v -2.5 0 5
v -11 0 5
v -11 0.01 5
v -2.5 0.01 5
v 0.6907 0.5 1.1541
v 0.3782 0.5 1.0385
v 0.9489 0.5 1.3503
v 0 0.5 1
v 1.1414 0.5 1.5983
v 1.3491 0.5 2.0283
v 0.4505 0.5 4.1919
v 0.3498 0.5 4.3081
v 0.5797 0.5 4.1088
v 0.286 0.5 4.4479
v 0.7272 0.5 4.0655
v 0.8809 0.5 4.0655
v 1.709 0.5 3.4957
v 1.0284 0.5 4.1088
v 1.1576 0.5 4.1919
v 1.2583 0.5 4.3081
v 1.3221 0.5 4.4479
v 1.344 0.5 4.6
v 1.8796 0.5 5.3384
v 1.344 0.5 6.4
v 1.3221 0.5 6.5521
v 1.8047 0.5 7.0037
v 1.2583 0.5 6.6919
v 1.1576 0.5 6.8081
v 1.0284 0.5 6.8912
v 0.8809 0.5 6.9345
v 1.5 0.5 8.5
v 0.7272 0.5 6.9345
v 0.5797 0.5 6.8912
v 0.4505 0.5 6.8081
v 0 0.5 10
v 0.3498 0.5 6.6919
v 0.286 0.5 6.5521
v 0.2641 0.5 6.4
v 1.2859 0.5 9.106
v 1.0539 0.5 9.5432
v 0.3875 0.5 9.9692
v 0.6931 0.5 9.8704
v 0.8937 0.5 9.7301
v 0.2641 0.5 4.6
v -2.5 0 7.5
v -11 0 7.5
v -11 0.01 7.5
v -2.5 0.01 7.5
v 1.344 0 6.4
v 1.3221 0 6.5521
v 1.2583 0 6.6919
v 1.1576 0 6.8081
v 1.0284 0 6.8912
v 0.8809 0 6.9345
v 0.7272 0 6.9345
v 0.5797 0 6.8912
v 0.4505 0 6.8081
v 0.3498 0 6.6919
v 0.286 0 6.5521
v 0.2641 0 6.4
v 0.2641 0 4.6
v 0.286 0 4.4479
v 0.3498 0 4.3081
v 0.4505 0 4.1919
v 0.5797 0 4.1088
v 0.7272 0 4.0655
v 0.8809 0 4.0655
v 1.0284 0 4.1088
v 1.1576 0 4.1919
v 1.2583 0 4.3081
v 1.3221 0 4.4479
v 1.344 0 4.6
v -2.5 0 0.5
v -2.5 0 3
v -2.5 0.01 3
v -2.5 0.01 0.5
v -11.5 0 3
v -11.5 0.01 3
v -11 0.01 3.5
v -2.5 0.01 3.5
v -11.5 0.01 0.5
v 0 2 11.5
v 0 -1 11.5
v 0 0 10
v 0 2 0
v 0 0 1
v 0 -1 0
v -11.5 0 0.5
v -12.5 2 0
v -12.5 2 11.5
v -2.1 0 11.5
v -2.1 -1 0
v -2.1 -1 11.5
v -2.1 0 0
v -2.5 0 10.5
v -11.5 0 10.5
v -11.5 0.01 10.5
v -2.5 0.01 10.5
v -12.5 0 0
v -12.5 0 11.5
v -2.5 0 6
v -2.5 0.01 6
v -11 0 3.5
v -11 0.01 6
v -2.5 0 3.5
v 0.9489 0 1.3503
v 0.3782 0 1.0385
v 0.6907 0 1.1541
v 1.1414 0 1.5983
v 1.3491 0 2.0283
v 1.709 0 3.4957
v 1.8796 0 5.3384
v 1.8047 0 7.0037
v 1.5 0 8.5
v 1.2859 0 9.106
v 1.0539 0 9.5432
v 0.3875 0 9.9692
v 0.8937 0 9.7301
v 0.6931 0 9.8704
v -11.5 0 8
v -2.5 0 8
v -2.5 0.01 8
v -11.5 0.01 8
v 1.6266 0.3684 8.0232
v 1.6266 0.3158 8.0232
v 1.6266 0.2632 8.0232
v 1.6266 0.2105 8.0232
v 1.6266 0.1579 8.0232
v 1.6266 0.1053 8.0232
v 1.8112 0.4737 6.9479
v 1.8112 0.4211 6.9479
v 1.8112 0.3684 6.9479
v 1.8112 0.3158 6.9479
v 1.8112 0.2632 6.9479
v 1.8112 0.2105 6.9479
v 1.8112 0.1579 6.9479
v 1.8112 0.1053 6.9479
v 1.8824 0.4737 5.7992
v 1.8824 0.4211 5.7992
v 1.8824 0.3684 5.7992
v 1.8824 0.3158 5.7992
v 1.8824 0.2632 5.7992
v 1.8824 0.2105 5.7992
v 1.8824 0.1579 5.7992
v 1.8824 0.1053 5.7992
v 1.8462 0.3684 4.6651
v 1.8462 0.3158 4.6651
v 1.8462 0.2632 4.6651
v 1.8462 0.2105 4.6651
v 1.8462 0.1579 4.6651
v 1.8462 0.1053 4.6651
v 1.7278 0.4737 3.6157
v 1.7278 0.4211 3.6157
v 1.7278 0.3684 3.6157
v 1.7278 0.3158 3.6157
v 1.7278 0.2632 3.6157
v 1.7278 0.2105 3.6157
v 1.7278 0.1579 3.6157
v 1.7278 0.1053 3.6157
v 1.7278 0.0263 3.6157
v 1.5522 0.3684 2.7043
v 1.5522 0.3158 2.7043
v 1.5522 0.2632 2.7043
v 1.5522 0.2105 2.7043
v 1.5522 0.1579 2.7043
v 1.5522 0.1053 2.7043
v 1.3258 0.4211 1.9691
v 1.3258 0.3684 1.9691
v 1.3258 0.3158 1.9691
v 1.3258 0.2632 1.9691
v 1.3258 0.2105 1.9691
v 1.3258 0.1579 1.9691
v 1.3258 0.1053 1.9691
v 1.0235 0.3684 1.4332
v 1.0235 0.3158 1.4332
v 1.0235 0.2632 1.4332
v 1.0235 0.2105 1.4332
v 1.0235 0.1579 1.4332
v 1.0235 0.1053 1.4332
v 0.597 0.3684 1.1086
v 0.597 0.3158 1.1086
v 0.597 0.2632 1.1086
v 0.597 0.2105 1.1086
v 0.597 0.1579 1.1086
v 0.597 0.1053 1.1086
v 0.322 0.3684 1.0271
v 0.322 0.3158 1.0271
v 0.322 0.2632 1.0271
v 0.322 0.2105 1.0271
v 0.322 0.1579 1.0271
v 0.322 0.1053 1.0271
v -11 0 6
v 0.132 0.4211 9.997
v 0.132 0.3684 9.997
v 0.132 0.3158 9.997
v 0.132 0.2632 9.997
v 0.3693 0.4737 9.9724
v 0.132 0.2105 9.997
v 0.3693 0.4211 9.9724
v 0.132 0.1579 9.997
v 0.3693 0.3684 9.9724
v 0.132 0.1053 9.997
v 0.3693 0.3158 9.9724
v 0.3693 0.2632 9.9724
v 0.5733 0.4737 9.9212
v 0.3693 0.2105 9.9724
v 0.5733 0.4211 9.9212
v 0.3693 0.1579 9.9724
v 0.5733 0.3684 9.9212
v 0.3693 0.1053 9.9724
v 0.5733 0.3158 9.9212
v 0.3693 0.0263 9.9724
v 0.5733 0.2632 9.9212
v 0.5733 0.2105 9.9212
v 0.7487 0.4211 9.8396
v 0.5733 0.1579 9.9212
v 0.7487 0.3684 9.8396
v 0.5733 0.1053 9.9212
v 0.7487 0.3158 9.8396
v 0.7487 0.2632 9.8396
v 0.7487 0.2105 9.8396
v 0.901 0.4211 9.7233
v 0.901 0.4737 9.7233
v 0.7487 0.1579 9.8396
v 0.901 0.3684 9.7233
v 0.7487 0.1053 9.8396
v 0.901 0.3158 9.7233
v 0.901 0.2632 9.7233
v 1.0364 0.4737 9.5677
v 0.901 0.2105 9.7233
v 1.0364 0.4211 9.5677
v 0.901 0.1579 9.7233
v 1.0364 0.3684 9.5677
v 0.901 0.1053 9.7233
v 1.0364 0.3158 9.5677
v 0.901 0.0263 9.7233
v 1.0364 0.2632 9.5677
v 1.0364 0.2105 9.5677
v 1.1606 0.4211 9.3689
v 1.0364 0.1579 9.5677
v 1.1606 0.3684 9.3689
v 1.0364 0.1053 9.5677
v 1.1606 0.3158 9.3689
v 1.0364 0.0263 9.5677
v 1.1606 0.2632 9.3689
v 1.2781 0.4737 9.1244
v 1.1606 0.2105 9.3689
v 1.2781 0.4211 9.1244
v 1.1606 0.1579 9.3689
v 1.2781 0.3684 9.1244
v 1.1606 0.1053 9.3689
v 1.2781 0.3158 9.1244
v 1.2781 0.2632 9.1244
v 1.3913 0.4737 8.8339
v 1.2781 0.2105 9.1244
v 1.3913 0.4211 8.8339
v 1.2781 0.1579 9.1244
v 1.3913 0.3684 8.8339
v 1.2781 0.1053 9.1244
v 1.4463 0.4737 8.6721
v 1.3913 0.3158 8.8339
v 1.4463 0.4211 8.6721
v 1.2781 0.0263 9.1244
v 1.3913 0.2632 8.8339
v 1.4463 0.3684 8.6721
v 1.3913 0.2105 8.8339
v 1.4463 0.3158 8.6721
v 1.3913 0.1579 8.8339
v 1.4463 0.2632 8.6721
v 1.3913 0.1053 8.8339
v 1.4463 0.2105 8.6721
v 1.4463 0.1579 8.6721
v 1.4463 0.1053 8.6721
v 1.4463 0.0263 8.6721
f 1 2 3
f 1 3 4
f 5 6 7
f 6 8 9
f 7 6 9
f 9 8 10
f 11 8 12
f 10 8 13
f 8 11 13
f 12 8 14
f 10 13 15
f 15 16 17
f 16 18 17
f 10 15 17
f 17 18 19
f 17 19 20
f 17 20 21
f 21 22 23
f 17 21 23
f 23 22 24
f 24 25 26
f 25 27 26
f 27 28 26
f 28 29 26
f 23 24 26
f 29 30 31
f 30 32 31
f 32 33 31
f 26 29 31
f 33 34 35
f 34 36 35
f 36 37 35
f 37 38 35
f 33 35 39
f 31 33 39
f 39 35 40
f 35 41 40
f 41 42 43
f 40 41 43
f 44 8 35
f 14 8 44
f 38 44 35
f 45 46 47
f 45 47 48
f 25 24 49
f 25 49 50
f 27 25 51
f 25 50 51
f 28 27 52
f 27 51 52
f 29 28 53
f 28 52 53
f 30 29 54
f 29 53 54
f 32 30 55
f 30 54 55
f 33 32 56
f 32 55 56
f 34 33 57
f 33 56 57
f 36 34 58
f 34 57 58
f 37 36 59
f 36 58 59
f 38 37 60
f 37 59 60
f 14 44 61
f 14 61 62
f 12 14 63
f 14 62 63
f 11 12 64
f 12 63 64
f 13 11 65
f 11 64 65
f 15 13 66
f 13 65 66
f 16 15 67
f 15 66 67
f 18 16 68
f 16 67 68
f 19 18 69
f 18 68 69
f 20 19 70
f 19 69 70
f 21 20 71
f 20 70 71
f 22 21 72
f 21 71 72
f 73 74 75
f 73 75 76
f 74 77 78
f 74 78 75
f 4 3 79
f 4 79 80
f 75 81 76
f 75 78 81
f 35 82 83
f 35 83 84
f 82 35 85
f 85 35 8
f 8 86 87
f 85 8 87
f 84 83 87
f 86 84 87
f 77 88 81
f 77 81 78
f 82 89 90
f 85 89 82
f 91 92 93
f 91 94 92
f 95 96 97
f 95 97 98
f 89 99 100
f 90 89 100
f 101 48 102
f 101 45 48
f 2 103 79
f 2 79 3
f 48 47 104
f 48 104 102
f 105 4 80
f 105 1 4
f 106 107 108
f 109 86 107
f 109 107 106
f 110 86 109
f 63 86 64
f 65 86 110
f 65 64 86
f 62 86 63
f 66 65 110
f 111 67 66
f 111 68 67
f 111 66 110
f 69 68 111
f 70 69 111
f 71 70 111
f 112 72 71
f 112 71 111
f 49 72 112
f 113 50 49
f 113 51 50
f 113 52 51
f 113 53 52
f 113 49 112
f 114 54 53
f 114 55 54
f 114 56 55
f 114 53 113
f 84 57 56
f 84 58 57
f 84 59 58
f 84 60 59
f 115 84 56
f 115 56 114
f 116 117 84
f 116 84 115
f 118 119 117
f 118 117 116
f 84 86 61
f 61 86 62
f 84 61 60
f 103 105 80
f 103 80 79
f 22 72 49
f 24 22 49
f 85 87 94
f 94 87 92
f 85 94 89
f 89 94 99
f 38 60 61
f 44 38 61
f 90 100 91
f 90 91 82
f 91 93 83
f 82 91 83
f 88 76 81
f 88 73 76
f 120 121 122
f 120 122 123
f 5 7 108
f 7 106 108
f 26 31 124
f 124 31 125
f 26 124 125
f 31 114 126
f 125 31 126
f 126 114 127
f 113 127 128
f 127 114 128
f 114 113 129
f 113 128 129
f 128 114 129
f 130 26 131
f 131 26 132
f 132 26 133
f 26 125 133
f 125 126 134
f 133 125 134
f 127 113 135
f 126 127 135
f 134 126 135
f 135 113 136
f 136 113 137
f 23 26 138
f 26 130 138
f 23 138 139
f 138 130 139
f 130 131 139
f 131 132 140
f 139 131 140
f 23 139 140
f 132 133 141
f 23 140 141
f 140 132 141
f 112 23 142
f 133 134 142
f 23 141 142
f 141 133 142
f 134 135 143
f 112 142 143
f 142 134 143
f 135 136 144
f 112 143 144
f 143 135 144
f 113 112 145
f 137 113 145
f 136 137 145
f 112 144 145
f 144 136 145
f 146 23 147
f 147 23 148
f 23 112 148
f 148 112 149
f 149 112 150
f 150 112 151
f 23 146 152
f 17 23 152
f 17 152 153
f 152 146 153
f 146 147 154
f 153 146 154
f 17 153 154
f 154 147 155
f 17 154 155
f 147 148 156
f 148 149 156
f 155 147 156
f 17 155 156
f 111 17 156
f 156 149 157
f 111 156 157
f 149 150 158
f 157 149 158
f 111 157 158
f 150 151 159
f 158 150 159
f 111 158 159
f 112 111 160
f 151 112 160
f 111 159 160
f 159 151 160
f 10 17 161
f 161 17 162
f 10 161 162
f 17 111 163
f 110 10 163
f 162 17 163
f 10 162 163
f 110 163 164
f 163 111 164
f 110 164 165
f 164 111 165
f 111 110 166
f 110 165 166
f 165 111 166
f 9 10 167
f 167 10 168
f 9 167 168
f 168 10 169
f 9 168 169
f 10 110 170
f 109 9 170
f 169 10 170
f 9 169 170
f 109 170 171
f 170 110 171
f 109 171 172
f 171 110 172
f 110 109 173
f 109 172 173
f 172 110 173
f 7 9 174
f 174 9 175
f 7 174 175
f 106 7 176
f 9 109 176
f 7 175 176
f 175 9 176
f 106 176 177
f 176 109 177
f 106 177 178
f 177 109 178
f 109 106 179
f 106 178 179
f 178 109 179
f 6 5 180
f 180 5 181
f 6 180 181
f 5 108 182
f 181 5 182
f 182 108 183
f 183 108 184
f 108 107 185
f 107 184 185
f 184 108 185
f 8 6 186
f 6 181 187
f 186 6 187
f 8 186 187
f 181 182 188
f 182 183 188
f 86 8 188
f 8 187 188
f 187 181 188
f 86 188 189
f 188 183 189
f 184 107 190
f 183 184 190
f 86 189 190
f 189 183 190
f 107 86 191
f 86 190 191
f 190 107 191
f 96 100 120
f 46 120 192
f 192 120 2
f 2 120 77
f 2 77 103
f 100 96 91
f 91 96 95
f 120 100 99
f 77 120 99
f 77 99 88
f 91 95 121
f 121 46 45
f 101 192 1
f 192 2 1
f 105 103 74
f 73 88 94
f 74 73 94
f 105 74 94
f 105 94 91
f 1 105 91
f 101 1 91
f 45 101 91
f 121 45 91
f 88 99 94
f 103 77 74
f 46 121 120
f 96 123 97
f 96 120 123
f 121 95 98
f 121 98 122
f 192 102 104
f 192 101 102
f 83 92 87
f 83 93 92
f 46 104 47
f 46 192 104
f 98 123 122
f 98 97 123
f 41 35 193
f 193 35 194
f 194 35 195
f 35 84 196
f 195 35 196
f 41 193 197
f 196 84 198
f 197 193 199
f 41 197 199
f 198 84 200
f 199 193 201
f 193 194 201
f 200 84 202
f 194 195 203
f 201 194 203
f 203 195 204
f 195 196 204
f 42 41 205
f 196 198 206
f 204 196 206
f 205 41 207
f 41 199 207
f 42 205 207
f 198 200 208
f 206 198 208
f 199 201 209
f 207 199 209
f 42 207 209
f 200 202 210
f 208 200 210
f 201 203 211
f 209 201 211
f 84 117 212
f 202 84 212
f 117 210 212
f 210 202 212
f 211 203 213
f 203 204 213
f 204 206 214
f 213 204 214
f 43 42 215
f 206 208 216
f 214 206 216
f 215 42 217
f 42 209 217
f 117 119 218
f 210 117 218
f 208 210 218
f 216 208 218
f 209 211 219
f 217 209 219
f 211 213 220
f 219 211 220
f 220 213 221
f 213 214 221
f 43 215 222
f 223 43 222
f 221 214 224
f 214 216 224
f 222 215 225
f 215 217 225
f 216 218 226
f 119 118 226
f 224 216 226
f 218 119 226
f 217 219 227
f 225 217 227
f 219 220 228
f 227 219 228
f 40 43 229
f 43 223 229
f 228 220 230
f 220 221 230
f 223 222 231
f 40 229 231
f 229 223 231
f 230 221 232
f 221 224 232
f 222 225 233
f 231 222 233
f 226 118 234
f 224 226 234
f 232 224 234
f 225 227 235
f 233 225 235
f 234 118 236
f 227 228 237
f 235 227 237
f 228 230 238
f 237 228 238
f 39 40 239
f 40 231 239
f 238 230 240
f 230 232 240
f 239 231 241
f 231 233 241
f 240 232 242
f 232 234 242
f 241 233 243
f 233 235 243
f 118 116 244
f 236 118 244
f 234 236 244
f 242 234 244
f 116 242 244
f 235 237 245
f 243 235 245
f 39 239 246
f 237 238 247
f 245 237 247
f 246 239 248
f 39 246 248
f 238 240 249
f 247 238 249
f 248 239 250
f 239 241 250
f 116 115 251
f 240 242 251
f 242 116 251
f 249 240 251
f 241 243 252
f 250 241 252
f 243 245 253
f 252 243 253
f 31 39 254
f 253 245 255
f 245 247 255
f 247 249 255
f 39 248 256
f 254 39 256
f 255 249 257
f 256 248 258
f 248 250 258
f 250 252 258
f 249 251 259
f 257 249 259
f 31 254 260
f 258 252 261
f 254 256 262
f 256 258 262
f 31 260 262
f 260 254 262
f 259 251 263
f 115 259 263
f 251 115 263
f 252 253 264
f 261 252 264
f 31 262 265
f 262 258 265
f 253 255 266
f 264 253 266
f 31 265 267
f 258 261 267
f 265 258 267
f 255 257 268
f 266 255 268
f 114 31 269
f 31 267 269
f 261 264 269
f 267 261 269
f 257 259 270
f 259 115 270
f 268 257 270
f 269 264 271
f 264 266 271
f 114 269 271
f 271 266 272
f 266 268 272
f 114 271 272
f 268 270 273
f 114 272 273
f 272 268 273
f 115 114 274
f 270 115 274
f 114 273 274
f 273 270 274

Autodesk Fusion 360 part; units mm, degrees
sketch "Sketch1" plane through (0, 0, 0) normal (0, 1, 0) x (1, 0, 0)
  line L0 (0, 0) -> (-12.5, 0)
  line L1 (-12.5, 0) -> (-12.5, -11.5)
  line L2 (-12.5, -11.5) -> (0, -11.5)
  line L3 (0, -11.5) -> (0, 0)
  dimension "d1" = 12.5
  dimension "d2" = 11.5
extrude "Extrude1" add sketch "Sketch1" along normal blind 2
sketch "Sketch2" plane through (0, 0, 0) normal (0, -1, 0) x (1, 0, 0)
  line L0 (0, 0) -> (0, 11.5)
  line L1 (0, 11.5) -> (-12.5, 11.5)
  line L2 (-12.5, 11.5) -> (-12.5, 0)
  line L3 (-12.5, 0) -> (0, 0)
  line L4 (0, 0) -> (-2.1, 0)
  line L5 (-2.1, 0) -> (-2.1, 11.5)
  line L6 (-2.1, 11.5) -> (0, 11.5)
  line L7 (0, 11.5) -> (0, 0)
  dimension "d5" = 2.1
extrude "Extrude2" add sketch "Sketch2" along normal blind 1 contours L0 L1 L3 L4 L5 L6 L7
sketch "Sketch3" plane through (0, 0, 0) normal (0, -1, 0) x (1, 0, 0)
  line L0 (-2.1, 0) -> (-2.1, 11.5)
  line L1 (-2.1, 11.5) -> (-12.5, 11.5)
  line L2 (-12.5, 11.5) -> (-12.5, 0)
  line L3 (-12.5, 0) -> (-2.1, 0)
  spline S0 degree 5 poles (0, 10) (0.1223, 10) (0.3487, 9.9879) (0.6334, 9.9337) (0.9192, 9.7757) (1.1918, 9.3796) (1.4459, 8.741) (1.6857, 7.8807) (1.8409, 6.9019) (1.9033, 5.8712) (1.8768, 4.8517) (1.7821, 3.8919) (1.6397, 3.0312) (1.4634, 2.2995) (1.248, 1.7174) (0.9635, 1.2964) (0.6503, 1.0932) (0.3517, 1.0169) (0.1223, 1) (0, 1) knots 0 0 0 0 0 0 0.066667 0.133333 0.2 0.266667 0.333333 0.4 0.466667 0.533333 0.6 0.666667 0.733333 0.8 0.866667 0.933333 1 1 1 1 1 1
  line L4 (0.2641, 6.4) -> (0.2641, 4.6)
  arc A0 (0.2641, 4.6) -> (1.344, 4.6) centre (0.804, 4.6) ccw
  line L5 (1.344, 4.6) -> (1.344, 6.4)
  arc A1 (1.344, 6.4) -> (0.2641, 6.4) centre (0.804, 6.4) ccw
  line L6 (0.804, 6.4) -> (0.804, 4.6) construction
  line L7 (1.2151, 9.4545) -> (1.7849, 7.5455)
  line L8 (0, 10) -> (0, 1)
  line L9 (-1, 10) -> (1, 10)
  line L10 (1, 1) -> (-1, 1)
  point P0 (1.5, 8.5)
  point P1 (1.5, 2.5)
  point P2 (0.804, 5.5)
  dimension "d8" = 5.5
  dimension "d9" = 1.8
extrude "Extrude3" add sketch "Sketch3" against normal blind 0.5 contours S0 L8
sketch "Sketch4" plane through (0, 0, 0) normal (0, -1, 0) x (1, 0, 0)
  line L0 (-2.1, 0) -> (-2.1, 11.5)
  line L1 (-2.1, 11.5) -> (-12.5, 11.5)
  line L2 (-12.5, 11.5) -> (-12.5, 0)
  line L3 (-12.5, 0) -> (-2.1, 0)
  line L4 (-11.5, 10.5) -> (-2.5, 10.5)
  line L5 (-2.5, 10.5) -> (-2.5, 8)
  line L6 (-2.5, 8) -> (-11.5, 8)
  line L7 (-11.5, 8) -> (-11.5, 10.5)
  line L8 (-2.5, 0.5) -> (-11.5, 0.5)
  line L9 (-11.5, 0.5) -> (-11.5, 3)
  line L10 (-11.5, 3) -> (-2.5, 3)
  line L11 (-2.5, 3) -> (-2.5, 0.5)
  line L12 (-11, 7.5) -> (-2.5, 7.5)
  line L13 (-2.5, 7.5) -> (-2.5, 6)
  line L14 (-2.5, 6) -> (-11, 6)
  line L15 (-11, 6) -> (-11, 7.5)
  line L16 (-2.5, 3.5) -> (-11, 3.5)
  line L17 (-11, 3.5) -> (-11, 5)
  line L18 (-11, 5) -> (-2.5, 5)
  line L19 (-2.5, 5) -> (-2.5, 3.5)
extrude "Extrude4" cut sketch "Sketch4" against normal blind 0.01 contours L4 L5 L6 L7 | L8 L9 L10 L11 | L12 L13 L14 L15 | L16 L17 L18 L19
